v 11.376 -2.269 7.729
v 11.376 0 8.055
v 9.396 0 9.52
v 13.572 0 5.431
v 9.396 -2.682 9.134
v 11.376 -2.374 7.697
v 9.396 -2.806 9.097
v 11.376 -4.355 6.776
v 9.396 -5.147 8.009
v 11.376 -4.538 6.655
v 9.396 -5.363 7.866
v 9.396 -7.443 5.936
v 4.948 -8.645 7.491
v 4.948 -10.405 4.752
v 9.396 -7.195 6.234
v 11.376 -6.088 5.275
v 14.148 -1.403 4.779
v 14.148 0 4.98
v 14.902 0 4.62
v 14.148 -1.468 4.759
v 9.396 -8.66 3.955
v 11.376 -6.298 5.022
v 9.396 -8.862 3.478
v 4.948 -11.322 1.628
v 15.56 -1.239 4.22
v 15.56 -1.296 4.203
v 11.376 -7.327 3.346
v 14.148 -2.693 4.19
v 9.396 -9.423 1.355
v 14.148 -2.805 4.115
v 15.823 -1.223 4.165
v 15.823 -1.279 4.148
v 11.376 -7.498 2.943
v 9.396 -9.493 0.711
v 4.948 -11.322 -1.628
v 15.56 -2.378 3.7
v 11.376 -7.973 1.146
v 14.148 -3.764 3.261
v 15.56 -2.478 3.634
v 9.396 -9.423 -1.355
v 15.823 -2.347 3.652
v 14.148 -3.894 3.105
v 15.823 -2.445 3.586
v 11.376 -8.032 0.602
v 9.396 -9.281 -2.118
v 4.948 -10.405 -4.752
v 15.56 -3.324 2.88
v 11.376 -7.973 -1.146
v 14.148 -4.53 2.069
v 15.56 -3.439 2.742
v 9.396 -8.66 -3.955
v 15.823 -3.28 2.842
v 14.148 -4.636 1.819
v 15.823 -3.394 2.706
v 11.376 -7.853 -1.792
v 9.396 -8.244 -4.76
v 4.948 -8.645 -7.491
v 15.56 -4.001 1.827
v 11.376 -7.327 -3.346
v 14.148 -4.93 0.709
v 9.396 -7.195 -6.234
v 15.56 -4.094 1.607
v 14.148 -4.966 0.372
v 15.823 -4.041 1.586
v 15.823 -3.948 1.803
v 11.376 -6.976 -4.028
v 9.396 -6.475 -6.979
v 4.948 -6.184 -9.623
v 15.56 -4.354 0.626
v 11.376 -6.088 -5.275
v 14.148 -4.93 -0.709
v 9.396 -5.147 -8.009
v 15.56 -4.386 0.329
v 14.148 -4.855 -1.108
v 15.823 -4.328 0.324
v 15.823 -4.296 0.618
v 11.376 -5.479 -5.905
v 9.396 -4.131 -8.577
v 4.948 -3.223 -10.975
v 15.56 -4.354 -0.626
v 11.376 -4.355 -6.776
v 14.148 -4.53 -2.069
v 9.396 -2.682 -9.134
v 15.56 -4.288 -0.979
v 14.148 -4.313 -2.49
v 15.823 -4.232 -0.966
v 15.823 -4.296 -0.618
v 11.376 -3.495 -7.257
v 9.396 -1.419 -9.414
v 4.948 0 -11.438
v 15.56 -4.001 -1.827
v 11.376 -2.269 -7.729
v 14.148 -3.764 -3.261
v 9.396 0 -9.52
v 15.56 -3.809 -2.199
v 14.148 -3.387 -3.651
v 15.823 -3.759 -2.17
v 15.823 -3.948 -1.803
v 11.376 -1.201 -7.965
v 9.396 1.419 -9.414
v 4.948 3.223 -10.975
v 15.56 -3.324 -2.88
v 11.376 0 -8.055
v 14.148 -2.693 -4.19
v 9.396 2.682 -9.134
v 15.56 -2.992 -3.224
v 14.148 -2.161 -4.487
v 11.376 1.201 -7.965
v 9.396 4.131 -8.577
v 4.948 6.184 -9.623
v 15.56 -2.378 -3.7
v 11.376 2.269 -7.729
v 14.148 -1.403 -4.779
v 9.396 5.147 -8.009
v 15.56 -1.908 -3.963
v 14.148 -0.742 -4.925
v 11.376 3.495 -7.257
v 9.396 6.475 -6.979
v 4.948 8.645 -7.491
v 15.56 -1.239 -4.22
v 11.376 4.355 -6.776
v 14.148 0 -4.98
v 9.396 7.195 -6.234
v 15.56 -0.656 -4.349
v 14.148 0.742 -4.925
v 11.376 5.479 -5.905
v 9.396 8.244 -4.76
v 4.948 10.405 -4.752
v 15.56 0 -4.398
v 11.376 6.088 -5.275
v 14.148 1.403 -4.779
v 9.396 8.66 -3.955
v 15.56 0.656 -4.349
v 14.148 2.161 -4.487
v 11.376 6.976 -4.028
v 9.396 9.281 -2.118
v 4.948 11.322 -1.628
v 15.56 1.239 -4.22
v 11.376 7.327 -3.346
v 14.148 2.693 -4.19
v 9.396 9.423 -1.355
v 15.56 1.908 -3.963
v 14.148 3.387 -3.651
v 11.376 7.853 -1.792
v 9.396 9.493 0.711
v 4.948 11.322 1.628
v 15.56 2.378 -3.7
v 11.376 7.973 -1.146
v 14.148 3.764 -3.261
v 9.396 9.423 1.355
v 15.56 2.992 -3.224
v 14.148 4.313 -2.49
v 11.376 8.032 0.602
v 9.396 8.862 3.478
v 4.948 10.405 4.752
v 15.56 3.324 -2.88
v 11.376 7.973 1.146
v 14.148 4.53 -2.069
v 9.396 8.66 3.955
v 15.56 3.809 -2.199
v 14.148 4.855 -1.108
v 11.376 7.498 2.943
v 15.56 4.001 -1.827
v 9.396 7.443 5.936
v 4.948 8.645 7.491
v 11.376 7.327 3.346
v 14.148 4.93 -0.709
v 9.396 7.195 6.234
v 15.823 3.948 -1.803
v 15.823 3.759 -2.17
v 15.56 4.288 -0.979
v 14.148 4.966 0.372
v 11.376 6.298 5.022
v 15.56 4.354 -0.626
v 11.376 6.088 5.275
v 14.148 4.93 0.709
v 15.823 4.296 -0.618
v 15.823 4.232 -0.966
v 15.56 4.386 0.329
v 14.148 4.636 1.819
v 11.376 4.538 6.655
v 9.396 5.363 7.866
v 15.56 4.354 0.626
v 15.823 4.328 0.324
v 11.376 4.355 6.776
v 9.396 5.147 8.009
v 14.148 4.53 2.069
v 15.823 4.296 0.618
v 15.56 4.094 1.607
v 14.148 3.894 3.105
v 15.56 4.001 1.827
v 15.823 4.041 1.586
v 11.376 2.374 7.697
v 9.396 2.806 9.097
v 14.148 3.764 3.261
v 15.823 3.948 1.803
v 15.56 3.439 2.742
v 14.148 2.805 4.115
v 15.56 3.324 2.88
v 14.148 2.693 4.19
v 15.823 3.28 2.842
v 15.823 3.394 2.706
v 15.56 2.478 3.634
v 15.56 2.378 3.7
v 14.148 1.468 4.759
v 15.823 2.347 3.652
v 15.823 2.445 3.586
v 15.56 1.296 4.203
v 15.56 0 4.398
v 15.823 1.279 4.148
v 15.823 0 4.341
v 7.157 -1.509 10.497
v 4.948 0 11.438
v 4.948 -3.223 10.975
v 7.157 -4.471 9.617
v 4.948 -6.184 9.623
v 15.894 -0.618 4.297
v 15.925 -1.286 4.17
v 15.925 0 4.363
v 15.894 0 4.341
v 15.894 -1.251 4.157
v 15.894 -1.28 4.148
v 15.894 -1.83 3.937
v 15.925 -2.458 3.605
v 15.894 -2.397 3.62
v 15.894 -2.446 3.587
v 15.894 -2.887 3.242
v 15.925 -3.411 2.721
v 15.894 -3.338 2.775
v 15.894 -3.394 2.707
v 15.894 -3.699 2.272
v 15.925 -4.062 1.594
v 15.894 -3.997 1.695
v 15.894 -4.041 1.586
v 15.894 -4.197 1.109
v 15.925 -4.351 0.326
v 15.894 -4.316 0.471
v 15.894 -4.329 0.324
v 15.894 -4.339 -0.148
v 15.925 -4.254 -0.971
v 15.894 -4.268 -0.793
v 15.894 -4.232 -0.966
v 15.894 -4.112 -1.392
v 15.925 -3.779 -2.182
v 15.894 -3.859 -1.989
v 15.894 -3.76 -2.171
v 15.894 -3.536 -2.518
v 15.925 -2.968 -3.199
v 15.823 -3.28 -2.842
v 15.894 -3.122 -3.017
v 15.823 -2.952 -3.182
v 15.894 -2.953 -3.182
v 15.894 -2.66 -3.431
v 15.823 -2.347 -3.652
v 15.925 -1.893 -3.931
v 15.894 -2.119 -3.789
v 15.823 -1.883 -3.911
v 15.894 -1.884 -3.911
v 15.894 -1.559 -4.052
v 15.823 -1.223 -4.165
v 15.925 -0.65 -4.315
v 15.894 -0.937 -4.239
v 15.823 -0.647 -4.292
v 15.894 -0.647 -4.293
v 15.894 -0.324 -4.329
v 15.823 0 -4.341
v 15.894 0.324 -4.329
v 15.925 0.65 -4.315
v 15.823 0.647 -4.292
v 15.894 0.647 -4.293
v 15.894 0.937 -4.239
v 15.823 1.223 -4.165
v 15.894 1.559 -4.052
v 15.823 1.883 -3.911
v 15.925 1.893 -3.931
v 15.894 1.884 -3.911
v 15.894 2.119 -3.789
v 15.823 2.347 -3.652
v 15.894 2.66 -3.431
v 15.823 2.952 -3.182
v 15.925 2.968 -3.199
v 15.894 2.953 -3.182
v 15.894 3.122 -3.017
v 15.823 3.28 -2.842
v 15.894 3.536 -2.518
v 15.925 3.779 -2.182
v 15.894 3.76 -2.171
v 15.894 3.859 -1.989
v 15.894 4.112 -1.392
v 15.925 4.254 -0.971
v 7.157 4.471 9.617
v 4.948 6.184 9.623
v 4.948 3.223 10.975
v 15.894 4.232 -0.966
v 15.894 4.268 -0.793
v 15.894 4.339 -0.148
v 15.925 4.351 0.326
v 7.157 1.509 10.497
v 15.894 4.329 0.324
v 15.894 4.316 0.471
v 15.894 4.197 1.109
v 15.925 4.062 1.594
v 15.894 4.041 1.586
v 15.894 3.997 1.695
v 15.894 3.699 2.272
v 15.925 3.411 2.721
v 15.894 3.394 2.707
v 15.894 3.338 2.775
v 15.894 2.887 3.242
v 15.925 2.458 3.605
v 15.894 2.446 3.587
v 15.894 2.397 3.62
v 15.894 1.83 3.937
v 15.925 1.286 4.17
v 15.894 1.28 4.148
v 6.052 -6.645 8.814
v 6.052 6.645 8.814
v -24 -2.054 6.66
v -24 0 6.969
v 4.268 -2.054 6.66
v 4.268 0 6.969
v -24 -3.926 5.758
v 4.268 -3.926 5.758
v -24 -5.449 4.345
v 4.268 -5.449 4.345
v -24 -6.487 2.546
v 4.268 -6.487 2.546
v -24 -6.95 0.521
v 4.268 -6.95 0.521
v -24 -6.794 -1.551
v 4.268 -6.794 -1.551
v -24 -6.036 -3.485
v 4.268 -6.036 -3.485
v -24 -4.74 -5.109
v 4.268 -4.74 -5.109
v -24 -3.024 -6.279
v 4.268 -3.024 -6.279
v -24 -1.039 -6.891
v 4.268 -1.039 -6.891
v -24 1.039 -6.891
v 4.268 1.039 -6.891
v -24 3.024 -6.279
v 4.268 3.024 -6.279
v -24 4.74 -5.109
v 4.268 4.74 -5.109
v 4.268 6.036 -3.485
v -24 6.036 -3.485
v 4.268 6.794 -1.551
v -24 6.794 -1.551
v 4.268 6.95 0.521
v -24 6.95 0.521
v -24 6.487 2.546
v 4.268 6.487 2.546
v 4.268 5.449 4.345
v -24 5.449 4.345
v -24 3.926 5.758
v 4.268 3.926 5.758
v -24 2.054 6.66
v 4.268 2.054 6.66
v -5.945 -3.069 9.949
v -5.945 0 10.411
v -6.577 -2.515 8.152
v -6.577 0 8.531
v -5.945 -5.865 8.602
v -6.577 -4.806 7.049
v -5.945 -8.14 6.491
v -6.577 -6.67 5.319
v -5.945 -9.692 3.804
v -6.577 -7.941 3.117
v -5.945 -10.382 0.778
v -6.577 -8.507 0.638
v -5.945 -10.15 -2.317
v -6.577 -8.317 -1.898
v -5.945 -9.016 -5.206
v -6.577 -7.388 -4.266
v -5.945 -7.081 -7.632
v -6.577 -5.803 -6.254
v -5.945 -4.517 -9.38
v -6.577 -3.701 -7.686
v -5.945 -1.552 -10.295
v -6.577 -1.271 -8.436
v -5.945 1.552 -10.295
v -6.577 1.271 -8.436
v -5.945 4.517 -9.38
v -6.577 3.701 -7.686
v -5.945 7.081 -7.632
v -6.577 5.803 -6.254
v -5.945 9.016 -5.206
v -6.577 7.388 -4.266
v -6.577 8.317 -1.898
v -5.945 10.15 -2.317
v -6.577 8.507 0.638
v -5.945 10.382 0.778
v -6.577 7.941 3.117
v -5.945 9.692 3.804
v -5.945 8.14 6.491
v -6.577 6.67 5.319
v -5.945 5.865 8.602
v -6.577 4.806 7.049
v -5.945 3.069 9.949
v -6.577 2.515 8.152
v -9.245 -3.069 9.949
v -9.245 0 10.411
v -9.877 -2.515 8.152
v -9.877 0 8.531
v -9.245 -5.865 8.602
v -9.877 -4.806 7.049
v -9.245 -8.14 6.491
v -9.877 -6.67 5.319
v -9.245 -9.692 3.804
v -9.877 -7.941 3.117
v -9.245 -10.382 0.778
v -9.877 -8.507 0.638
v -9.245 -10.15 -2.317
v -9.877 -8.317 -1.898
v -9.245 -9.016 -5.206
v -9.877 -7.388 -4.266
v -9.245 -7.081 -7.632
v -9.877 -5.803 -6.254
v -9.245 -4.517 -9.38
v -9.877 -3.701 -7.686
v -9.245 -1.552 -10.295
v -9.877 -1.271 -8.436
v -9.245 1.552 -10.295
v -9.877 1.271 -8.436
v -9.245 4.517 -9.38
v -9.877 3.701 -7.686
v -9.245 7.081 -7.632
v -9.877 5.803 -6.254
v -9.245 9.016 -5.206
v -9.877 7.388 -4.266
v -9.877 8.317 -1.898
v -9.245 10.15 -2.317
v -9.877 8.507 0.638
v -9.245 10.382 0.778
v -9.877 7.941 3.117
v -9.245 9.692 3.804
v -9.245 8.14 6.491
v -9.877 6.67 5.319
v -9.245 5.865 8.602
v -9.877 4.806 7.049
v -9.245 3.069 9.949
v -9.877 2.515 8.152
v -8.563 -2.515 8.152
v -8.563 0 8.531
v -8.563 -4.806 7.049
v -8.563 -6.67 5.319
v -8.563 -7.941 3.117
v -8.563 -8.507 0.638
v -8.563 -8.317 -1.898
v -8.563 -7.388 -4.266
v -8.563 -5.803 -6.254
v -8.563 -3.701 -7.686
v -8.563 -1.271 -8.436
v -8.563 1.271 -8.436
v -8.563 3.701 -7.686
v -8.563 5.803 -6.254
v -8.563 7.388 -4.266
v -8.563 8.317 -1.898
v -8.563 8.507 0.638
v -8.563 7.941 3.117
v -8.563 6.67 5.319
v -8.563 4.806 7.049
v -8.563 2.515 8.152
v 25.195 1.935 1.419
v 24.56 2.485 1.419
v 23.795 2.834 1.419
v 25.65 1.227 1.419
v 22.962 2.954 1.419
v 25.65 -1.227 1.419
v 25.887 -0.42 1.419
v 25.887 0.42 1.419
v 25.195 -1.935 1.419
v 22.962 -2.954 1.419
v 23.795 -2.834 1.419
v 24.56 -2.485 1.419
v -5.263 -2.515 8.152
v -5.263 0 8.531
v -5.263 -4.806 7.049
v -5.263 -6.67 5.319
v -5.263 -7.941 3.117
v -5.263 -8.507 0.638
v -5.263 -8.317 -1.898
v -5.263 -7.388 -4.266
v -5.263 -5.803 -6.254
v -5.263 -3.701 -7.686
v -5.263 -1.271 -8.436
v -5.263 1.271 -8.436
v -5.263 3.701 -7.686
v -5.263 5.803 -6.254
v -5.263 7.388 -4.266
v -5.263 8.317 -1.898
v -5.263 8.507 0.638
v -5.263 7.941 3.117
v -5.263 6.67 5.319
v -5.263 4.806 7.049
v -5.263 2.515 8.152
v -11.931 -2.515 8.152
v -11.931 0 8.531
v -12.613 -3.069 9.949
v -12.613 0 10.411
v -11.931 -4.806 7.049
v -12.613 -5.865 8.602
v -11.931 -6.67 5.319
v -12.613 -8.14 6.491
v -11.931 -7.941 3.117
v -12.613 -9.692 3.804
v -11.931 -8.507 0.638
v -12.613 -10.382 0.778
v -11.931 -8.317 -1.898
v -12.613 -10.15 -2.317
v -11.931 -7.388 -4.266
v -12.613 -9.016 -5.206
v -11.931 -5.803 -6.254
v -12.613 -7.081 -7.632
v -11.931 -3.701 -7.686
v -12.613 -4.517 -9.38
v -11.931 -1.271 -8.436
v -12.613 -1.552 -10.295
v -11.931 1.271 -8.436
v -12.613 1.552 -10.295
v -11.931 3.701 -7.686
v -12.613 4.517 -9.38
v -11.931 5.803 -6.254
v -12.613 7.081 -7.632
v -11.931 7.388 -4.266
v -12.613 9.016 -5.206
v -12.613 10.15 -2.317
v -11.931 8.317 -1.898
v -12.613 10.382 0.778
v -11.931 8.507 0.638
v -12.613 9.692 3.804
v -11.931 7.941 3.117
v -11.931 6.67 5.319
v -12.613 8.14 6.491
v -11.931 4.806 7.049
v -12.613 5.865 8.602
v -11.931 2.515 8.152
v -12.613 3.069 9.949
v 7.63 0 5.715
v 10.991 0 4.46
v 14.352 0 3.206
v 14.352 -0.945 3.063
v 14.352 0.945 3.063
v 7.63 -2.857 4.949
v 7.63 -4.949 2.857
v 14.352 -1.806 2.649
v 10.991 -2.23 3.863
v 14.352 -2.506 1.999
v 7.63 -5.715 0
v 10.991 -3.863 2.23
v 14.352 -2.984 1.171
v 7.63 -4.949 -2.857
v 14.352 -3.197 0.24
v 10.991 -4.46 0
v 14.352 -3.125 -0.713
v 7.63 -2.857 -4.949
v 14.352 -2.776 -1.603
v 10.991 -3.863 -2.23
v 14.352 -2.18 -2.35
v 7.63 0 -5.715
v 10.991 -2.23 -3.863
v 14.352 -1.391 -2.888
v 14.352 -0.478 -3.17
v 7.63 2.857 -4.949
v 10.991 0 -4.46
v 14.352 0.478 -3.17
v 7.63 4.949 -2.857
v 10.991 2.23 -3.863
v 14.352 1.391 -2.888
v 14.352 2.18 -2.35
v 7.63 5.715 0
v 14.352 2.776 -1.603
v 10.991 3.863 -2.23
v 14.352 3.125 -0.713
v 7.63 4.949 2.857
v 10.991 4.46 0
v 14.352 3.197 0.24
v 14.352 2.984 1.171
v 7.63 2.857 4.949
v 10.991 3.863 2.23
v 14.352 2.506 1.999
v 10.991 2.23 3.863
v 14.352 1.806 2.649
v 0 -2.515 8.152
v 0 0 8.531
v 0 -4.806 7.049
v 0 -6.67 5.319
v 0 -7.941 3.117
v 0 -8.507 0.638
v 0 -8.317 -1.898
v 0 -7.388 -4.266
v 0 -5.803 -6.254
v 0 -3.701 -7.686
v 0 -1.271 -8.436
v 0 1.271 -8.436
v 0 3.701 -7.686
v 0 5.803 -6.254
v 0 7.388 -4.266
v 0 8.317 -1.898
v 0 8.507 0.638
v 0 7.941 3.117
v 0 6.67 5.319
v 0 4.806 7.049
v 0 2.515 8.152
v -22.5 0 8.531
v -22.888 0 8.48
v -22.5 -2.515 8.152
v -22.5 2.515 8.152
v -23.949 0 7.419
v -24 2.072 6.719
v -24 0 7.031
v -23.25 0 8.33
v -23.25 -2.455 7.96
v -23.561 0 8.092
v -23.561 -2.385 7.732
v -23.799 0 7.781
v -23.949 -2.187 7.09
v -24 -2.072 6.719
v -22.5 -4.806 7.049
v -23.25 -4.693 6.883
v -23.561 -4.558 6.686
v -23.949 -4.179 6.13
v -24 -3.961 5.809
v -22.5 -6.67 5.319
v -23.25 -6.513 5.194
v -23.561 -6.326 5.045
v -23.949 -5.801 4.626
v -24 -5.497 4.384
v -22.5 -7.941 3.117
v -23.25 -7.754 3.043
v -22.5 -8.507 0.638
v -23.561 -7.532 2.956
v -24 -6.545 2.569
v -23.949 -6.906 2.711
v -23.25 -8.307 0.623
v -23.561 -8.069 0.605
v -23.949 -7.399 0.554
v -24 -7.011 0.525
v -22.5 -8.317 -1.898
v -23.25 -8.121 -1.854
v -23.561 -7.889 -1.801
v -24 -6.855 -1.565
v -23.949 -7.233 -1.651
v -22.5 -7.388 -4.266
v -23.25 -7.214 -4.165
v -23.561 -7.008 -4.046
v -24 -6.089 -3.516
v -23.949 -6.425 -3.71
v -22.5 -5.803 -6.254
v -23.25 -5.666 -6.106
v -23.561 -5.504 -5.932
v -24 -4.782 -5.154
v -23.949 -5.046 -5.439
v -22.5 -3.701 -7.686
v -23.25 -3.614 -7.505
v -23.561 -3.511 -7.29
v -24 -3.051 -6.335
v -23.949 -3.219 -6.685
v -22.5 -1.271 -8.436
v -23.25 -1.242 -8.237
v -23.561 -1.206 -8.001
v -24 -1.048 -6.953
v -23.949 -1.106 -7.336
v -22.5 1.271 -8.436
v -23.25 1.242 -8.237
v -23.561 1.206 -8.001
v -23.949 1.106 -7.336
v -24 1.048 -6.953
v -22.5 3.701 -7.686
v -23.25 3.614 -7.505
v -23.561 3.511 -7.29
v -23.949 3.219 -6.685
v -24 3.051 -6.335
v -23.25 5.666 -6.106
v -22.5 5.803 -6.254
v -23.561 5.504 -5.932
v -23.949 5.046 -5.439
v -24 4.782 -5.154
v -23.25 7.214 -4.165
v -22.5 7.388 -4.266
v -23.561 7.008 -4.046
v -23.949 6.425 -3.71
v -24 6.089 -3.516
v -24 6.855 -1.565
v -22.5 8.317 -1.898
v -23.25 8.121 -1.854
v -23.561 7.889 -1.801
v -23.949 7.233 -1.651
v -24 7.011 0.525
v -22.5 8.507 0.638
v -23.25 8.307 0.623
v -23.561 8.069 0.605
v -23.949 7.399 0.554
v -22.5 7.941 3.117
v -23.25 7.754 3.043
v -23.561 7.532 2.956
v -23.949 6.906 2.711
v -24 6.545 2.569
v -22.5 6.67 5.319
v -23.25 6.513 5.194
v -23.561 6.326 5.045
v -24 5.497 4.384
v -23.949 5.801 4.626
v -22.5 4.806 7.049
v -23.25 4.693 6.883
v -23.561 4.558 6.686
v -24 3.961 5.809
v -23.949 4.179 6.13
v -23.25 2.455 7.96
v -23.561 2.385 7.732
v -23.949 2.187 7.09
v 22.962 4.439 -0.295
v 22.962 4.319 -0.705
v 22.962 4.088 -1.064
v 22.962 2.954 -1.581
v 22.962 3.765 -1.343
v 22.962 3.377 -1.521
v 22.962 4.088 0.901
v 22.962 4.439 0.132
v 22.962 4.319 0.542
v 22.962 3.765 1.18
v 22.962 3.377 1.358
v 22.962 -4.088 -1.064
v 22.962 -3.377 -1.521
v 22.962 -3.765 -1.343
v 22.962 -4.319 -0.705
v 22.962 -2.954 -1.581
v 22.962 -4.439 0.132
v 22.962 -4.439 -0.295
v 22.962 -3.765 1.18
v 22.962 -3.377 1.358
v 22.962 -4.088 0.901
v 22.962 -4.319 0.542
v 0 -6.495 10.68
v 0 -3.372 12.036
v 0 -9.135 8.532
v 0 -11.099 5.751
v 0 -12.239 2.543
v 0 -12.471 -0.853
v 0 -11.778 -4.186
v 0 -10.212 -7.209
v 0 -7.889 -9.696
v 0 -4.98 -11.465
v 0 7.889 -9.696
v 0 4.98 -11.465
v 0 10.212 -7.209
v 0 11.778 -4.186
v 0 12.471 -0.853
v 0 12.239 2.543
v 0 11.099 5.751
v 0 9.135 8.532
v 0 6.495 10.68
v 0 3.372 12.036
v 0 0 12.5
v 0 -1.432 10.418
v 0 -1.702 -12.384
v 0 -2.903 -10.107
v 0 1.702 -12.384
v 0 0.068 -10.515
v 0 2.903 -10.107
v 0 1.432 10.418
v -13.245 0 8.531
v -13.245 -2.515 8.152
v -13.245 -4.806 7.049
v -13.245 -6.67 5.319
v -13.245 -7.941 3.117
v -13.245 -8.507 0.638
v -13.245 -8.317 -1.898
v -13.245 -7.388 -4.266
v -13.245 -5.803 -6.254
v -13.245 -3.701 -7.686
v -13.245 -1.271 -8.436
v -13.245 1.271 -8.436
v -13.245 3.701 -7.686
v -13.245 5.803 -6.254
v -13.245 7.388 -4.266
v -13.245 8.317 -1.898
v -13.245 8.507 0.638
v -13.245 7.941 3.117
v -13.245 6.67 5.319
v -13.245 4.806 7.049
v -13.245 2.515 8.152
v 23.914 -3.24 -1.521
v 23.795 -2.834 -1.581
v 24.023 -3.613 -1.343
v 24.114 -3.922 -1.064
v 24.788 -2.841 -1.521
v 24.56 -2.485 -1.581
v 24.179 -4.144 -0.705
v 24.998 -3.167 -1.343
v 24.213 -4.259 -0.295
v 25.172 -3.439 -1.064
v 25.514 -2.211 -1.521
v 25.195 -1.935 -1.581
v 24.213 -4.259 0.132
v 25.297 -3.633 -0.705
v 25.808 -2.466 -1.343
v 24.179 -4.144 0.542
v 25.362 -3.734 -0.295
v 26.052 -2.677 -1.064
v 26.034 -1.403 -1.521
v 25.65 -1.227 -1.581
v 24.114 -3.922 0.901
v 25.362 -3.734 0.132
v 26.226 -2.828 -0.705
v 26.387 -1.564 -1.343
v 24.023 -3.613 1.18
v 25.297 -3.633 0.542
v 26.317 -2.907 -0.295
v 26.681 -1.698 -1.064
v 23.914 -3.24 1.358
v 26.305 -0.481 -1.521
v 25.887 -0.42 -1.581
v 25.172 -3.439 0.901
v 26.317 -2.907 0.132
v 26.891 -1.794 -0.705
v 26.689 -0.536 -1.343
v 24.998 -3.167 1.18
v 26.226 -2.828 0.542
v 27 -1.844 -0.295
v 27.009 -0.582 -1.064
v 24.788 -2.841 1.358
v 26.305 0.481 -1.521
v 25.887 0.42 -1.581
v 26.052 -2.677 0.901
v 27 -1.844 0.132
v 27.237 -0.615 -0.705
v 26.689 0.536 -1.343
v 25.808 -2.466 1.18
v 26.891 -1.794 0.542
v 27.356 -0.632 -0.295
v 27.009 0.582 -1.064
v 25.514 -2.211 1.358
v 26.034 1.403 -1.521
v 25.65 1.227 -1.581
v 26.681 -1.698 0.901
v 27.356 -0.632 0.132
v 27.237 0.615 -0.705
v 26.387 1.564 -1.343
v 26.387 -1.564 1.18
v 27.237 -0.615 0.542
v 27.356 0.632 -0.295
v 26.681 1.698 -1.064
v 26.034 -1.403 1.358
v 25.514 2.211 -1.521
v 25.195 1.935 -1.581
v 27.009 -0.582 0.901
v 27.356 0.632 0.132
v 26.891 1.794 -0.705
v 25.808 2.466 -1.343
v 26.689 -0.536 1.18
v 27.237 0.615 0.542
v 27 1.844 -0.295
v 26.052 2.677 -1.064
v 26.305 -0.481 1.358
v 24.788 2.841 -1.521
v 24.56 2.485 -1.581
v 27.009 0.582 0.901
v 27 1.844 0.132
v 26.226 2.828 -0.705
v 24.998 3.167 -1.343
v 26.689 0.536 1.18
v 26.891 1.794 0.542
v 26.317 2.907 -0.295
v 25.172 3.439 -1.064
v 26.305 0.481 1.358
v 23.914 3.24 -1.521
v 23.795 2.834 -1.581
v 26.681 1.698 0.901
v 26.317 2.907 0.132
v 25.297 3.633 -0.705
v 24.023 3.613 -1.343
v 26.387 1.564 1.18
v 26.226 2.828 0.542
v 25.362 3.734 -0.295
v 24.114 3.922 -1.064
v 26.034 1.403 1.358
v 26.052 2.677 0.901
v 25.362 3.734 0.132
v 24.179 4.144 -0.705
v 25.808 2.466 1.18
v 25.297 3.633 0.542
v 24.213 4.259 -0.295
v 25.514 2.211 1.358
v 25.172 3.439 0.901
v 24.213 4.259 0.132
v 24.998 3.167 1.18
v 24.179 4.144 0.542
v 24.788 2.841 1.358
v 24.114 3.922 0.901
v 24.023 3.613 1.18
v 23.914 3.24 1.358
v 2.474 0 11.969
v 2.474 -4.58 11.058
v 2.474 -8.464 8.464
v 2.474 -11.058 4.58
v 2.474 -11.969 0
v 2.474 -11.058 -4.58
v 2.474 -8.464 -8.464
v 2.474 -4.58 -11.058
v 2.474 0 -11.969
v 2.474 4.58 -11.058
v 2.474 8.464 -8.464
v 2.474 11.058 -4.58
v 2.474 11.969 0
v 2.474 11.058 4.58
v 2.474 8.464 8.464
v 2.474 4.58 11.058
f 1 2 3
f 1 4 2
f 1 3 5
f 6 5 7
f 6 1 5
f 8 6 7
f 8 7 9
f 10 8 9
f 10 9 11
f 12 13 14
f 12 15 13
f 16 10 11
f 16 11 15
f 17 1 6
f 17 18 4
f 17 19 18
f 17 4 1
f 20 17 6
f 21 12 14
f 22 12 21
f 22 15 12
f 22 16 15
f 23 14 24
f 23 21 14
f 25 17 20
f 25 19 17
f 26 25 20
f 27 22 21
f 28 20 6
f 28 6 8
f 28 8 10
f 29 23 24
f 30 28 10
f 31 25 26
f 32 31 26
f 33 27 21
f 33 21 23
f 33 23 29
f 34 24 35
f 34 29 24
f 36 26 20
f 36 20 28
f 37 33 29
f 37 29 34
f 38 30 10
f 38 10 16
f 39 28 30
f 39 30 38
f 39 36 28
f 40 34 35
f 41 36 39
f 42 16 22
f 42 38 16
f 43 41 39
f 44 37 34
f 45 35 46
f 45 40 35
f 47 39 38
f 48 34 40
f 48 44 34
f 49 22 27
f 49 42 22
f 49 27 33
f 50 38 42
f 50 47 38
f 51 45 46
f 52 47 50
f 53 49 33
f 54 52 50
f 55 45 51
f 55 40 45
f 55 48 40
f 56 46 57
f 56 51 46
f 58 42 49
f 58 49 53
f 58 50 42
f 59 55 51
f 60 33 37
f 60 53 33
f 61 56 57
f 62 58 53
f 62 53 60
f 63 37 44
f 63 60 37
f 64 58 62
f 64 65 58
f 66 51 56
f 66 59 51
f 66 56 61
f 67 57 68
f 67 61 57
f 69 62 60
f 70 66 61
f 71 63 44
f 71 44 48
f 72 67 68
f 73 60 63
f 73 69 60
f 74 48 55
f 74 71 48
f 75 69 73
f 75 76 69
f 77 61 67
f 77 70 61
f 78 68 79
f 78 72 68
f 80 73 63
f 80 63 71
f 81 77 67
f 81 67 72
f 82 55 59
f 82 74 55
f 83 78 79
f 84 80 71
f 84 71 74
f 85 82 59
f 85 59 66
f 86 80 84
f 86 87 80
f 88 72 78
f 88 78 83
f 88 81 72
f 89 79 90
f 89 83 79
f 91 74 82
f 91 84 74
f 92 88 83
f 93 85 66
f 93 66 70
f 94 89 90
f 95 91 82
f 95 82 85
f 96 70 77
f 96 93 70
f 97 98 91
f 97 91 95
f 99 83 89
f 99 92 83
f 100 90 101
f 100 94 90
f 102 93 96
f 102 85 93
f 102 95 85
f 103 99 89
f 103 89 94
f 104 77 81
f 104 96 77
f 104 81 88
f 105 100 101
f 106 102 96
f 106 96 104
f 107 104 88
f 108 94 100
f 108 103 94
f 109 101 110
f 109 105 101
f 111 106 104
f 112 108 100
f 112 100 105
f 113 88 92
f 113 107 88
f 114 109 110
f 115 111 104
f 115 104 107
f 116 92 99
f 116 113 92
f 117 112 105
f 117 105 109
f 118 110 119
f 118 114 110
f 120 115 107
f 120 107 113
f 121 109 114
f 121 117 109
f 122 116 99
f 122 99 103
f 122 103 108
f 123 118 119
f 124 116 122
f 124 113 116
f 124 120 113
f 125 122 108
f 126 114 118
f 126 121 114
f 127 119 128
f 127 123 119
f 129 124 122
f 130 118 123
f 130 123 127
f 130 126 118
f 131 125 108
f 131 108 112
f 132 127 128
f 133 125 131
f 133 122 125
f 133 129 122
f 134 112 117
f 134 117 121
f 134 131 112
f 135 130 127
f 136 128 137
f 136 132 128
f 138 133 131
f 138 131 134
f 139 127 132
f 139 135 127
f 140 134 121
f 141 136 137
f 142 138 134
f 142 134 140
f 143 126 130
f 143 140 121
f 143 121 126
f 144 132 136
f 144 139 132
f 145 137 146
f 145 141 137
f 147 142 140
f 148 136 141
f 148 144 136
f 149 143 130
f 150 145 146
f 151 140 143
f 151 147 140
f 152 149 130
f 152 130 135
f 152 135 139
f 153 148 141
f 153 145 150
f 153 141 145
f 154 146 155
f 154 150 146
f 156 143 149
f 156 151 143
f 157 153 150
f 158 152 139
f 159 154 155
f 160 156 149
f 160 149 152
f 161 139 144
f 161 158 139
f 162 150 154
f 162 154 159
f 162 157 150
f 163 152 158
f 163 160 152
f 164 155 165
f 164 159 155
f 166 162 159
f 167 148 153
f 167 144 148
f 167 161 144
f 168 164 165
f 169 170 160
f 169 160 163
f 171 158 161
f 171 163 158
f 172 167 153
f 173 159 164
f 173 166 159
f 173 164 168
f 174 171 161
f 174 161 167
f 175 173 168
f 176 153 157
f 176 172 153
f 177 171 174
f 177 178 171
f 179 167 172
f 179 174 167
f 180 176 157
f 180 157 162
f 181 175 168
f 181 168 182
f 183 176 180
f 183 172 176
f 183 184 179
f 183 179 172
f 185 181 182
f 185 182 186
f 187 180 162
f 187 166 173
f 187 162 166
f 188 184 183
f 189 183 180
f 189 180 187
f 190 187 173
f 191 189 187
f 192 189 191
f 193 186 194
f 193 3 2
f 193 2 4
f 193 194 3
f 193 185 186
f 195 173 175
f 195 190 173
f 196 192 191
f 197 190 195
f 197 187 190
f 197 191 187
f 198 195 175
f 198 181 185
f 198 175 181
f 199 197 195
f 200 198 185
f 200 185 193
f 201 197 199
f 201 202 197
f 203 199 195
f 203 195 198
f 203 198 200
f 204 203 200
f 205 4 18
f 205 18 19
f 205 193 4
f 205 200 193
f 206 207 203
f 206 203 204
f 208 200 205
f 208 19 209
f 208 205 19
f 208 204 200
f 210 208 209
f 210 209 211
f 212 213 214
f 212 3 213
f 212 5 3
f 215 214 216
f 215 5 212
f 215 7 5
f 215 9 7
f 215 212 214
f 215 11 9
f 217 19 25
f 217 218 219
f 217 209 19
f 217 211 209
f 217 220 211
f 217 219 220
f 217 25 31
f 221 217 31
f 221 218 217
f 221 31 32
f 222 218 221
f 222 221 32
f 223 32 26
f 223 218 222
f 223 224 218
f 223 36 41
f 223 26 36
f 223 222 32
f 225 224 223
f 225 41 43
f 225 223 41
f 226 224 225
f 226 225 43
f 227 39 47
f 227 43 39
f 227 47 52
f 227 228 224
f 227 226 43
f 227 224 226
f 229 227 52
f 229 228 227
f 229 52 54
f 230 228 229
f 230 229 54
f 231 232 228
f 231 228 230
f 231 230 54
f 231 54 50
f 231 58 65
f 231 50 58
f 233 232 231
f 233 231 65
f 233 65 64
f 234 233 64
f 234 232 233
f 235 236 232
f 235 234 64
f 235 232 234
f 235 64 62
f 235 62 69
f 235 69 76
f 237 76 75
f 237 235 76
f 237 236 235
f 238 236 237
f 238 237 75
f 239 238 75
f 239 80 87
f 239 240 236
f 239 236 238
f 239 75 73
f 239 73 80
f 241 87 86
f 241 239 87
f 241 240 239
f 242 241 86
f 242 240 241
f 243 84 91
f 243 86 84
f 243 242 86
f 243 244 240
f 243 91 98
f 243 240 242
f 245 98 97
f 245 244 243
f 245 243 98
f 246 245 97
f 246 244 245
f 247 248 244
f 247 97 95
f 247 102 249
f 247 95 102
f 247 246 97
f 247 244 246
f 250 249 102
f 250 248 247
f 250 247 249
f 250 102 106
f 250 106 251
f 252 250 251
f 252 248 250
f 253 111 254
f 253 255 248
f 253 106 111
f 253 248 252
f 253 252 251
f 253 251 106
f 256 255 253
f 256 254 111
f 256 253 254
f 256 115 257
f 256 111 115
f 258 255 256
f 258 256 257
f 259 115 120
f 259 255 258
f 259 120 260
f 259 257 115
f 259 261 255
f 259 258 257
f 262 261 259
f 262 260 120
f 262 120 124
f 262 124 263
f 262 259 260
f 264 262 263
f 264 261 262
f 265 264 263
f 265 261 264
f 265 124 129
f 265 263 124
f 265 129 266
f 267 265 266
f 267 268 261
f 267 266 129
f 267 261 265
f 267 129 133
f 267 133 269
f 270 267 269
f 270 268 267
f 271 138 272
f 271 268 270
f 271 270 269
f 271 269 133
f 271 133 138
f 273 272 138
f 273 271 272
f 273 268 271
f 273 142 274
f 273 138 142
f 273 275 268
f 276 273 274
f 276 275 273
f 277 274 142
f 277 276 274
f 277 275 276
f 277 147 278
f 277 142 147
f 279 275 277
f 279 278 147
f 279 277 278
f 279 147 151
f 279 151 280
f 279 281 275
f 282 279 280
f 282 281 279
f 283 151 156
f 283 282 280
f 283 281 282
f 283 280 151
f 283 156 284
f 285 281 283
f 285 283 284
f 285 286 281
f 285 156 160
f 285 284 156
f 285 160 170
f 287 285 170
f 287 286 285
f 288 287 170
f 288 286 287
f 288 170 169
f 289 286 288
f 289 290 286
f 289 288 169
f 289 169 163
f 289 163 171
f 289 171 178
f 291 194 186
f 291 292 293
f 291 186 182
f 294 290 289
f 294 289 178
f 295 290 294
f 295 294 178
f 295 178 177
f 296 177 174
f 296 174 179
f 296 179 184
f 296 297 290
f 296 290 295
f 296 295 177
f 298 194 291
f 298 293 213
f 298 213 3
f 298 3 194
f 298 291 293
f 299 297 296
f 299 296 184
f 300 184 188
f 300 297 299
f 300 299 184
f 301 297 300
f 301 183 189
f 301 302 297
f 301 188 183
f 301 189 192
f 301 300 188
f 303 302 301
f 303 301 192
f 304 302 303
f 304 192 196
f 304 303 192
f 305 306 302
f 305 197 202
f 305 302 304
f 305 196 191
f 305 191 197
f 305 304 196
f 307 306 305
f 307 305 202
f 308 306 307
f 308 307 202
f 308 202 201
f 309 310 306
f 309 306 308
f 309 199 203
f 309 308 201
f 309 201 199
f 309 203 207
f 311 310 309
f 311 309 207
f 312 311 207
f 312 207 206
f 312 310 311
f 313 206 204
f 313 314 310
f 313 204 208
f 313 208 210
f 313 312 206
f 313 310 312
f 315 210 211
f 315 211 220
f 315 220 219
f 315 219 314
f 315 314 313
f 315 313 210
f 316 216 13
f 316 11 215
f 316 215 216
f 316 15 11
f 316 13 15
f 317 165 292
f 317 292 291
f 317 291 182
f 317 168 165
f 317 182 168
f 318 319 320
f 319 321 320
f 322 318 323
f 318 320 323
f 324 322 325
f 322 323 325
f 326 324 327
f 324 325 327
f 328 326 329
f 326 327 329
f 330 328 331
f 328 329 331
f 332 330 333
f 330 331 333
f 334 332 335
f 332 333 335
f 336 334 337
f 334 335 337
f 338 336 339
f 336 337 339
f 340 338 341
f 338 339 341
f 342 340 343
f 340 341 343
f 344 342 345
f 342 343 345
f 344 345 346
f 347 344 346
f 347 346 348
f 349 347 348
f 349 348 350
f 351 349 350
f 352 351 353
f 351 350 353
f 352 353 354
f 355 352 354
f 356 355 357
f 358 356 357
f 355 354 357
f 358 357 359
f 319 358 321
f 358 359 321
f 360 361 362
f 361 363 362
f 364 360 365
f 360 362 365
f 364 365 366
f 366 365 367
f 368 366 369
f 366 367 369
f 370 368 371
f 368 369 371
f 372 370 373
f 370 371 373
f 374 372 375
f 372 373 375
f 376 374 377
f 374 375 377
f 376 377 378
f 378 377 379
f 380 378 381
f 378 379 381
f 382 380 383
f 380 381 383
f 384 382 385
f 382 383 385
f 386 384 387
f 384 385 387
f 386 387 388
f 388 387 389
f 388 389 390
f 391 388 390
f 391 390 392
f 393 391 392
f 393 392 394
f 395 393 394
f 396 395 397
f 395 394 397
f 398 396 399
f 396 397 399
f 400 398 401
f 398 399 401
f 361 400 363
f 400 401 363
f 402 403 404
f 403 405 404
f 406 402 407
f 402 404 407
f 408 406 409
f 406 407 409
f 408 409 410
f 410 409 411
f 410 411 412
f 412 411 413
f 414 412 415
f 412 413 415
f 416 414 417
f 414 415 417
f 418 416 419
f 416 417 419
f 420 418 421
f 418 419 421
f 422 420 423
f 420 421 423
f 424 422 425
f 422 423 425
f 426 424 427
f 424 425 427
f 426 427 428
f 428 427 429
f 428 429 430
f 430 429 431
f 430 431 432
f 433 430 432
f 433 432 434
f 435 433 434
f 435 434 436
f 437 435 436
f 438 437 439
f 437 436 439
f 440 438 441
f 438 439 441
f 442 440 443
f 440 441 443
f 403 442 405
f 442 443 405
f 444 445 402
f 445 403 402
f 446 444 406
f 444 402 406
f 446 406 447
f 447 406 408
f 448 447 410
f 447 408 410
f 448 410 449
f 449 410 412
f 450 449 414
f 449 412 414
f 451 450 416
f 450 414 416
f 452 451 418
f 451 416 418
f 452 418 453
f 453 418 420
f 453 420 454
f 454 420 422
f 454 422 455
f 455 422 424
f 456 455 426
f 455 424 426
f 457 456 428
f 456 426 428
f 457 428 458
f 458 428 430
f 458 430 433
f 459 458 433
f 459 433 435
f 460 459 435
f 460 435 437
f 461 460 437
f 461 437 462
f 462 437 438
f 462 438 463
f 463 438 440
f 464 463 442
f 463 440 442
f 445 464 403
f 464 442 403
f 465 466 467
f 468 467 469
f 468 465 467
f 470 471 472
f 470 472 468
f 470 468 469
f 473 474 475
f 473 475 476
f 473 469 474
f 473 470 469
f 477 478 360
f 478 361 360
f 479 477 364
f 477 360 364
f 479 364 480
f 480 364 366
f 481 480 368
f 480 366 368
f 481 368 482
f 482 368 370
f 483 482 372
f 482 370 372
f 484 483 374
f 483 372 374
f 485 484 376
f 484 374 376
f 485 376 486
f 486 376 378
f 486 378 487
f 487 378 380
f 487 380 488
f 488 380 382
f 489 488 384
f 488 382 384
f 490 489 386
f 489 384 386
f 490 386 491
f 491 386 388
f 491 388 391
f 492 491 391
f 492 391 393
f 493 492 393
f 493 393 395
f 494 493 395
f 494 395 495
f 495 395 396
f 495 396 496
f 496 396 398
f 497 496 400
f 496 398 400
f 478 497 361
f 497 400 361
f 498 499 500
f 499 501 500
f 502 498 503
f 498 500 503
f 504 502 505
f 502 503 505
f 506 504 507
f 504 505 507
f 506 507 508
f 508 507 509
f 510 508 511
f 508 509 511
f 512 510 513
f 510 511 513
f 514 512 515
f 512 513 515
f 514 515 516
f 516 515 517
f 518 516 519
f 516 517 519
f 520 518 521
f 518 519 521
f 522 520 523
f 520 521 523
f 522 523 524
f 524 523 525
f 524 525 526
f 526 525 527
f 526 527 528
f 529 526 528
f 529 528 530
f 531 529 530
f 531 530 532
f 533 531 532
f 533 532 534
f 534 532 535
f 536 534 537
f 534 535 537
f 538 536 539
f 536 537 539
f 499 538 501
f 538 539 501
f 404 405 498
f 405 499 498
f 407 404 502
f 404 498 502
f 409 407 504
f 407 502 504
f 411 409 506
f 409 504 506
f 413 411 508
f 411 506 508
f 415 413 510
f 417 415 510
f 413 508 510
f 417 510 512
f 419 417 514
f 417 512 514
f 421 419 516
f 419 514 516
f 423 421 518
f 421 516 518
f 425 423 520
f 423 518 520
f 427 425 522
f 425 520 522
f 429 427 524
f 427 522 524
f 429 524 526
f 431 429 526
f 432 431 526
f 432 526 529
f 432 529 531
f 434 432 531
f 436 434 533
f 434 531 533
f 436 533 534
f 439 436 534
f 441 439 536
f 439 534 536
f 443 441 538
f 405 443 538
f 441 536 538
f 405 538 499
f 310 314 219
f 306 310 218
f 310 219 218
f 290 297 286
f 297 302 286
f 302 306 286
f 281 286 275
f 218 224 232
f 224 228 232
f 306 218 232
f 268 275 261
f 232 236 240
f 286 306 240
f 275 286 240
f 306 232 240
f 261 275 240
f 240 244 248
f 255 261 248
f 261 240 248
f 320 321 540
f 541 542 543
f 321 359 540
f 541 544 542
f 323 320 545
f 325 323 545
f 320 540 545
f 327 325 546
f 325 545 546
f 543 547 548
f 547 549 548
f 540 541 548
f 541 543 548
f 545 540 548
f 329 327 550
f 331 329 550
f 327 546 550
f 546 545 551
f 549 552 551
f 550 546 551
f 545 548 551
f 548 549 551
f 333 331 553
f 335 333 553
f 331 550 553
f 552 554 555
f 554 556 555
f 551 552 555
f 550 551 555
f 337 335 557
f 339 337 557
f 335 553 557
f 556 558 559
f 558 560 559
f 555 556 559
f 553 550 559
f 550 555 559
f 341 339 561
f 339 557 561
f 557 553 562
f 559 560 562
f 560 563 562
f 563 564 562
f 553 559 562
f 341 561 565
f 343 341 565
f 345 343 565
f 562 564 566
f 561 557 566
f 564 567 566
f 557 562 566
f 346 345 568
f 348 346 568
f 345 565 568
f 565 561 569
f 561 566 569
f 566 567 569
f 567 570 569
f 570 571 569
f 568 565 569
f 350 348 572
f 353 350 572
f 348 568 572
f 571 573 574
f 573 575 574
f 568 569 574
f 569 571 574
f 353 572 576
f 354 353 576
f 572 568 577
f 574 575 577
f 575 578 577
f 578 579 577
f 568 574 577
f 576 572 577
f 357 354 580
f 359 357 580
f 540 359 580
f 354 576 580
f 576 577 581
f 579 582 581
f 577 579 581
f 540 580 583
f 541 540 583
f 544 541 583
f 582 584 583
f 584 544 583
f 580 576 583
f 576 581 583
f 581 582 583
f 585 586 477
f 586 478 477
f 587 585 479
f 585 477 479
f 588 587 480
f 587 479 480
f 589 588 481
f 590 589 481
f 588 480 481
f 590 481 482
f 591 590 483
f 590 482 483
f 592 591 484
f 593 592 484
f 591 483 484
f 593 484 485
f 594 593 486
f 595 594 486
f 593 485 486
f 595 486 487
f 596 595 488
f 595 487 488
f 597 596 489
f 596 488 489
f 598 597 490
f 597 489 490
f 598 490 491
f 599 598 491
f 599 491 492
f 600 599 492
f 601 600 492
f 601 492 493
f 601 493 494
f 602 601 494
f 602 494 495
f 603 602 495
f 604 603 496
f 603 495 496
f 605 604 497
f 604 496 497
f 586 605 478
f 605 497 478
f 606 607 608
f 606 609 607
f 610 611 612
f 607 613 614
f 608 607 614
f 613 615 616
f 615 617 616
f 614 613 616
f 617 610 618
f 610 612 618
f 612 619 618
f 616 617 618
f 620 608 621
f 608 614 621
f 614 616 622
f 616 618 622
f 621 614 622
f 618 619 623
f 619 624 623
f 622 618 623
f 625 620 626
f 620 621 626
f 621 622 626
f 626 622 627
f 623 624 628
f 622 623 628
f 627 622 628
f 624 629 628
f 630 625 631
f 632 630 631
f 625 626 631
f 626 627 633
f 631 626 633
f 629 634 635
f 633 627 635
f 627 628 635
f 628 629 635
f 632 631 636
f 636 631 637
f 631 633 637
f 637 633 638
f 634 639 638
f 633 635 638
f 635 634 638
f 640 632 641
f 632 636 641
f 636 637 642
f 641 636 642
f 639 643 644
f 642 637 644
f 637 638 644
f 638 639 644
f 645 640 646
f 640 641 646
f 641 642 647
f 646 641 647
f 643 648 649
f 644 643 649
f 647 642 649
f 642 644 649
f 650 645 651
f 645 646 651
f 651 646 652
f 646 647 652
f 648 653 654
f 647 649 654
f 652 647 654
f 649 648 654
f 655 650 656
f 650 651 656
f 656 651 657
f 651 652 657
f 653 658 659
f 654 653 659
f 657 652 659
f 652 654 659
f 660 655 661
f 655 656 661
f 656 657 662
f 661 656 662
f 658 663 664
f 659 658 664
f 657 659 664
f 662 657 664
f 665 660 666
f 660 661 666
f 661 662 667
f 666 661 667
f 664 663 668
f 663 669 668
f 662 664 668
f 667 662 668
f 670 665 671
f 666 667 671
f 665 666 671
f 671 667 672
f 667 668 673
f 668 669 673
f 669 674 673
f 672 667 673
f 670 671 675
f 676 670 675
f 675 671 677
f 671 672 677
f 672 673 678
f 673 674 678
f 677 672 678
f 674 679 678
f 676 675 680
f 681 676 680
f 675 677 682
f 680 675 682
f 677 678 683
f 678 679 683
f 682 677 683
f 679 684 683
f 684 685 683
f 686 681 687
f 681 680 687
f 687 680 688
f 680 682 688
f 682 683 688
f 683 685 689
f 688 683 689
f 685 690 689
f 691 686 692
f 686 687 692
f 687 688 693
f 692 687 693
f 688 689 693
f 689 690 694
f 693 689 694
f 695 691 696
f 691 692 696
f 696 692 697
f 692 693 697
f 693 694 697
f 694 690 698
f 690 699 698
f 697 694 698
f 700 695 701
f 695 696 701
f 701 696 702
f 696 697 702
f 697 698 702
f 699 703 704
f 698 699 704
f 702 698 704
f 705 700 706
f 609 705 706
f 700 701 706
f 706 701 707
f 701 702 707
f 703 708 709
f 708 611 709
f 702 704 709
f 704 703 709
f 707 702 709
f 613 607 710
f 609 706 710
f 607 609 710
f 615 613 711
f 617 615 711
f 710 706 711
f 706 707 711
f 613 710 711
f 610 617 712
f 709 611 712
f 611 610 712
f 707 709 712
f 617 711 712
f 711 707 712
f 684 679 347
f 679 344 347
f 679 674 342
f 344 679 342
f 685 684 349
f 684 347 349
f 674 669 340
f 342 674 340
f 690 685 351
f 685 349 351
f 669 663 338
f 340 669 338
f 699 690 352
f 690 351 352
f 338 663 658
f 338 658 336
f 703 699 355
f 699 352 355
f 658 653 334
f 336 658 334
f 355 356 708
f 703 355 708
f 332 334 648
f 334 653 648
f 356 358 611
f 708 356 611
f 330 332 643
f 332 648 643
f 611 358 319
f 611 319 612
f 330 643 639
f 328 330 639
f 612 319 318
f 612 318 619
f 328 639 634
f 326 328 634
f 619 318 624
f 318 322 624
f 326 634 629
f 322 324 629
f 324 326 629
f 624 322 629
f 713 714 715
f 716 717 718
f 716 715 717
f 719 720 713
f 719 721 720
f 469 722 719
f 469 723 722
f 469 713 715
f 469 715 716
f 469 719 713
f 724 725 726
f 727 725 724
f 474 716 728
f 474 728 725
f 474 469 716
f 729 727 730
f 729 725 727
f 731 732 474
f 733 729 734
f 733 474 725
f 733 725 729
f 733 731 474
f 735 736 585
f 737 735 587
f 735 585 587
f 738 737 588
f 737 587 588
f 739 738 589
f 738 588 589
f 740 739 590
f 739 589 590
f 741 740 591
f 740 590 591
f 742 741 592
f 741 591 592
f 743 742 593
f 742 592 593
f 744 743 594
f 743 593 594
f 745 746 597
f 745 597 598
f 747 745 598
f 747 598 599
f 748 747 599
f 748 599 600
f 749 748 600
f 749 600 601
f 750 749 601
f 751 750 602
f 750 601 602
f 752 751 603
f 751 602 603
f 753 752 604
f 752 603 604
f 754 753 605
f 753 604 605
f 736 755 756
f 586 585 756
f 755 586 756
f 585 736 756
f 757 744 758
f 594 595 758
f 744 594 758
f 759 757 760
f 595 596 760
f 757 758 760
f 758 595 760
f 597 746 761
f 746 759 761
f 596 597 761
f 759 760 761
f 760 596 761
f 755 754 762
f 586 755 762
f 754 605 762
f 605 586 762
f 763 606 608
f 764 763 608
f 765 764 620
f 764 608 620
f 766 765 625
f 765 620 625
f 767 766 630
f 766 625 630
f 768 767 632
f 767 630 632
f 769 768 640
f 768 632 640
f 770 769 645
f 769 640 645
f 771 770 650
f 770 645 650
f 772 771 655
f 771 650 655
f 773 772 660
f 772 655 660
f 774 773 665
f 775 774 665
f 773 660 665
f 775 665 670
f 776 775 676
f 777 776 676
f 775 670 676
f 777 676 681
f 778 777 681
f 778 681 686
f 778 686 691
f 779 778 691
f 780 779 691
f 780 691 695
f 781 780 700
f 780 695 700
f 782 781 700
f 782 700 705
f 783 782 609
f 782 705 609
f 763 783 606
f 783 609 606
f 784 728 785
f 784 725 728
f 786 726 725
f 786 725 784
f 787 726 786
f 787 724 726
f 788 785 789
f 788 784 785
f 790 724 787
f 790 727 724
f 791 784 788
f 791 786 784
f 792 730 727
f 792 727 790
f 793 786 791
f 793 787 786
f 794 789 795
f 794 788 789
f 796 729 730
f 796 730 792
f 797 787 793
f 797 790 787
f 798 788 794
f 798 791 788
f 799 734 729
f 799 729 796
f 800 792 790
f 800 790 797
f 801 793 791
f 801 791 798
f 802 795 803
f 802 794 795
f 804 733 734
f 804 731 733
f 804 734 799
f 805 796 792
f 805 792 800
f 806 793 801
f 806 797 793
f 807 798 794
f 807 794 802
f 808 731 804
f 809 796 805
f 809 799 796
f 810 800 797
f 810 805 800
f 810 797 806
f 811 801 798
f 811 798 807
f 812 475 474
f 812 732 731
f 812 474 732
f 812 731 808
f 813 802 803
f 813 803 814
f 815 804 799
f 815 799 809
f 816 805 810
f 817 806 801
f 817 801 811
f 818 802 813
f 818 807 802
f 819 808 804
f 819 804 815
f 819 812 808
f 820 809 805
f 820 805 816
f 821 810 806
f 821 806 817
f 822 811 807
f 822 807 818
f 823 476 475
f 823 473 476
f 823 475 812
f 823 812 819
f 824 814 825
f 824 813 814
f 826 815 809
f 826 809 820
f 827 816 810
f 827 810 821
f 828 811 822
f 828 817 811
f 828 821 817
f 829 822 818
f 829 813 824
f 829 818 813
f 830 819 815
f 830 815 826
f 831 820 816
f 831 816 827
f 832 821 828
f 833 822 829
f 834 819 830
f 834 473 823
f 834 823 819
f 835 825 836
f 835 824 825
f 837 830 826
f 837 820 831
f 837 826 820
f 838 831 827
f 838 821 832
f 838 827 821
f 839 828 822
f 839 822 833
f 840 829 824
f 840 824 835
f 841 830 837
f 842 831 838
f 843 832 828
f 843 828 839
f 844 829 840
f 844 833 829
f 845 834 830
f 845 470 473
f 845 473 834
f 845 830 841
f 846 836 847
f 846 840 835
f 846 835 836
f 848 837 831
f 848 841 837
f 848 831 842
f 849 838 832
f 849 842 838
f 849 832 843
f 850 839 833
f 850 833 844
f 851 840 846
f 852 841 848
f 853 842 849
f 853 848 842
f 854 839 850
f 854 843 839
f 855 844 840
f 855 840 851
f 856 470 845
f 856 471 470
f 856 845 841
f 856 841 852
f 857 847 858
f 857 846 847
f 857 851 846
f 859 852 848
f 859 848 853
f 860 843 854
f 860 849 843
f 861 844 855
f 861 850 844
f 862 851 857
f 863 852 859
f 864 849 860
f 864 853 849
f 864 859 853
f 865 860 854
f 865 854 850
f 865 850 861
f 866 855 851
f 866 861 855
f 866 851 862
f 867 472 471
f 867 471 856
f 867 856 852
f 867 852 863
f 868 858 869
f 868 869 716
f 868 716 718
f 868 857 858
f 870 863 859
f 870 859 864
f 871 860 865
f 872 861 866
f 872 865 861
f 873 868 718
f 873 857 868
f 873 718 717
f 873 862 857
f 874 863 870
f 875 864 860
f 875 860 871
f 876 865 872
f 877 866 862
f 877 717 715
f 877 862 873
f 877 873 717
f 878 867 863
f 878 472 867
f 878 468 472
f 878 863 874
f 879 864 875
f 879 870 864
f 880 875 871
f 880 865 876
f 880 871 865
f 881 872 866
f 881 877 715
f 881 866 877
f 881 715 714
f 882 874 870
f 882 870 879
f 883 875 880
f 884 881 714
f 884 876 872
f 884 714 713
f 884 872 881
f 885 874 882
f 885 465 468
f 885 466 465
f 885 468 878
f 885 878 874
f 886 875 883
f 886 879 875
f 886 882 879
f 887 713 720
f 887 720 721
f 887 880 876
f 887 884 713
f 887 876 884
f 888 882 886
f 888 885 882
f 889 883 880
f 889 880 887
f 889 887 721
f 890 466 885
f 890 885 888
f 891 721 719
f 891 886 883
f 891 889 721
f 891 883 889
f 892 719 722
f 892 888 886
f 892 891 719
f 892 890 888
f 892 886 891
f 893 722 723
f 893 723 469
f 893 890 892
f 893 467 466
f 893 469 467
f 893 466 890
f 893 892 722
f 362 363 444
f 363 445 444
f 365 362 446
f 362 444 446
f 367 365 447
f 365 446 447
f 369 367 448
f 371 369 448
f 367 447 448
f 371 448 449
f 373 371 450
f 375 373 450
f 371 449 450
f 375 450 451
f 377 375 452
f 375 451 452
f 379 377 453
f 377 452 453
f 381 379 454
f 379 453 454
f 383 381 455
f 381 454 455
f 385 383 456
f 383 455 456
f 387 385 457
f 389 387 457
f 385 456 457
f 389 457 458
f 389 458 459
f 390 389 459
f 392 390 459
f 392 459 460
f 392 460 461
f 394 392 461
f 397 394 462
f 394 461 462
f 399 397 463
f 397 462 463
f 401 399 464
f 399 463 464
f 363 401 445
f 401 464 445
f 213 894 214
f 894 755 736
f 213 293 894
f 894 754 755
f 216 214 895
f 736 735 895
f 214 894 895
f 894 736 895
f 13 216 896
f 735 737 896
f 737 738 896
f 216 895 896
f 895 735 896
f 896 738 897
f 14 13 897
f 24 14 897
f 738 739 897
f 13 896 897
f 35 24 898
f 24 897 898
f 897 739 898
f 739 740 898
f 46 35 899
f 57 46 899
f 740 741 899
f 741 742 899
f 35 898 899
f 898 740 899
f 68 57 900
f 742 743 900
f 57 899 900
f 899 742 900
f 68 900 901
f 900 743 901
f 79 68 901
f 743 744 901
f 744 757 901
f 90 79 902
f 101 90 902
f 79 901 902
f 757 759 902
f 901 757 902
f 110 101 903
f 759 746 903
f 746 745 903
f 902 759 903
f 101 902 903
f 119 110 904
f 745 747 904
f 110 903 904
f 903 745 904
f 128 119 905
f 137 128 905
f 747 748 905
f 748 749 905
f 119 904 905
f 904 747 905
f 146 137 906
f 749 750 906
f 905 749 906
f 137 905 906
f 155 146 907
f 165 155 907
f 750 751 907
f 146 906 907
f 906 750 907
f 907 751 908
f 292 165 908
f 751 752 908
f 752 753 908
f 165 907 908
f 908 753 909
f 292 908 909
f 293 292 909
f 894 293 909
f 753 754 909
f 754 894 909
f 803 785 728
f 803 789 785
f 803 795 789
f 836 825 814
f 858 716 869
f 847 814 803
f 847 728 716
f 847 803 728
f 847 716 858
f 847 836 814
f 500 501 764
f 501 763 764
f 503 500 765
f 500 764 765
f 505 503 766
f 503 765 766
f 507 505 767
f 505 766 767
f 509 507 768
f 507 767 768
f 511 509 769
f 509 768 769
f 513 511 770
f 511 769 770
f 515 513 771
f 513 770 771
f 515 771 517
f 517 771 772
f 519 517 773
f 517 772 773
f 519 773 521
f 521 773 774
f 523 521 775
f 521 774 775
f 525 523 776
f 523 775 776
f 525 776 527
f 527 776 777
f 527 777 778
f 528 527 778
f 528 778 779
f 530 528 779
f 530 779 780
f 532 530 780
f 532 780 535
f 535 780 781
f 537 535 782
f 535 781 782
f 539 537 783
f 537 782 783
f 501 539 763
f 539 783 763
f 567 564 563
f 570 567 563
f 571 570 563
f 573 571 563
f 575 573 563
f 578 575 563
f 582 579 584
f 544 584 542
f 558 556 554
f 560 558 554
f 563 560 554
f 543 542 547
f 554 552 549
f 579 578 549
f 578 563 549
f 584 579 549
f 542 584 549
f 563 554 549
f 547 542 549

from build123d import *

# Parameters (mm, degrees)
F3_ANGLE_BACK = 90
F3_ANGLE      = 180
F5_R          = 1.5


# Not quite as in the source:
# - the program builds the solid bodies; features that only make, move or delete a surface that nothing else refers to are left out


with BuildPart() as f1:
    # F0 (on Front) → F1 (revolve)
    with BuildSketch(Plane.XZ):
        Polygon((-6.5773623064, 8.5310461), (-5.2633433491, 8.5310461), (-5.9452718124, 10.4112434772), align=None)
        with BuildLine():
            Line((0, 12.5), (-2.086e-07, 8.5310461))
            Line((-2.086e-07, 8.5310461), (-5.2633433491, 8.5310461))
            Line((-5.2633433491, 8.5310461), (-6.5773623064, 8.5310461))
            Line((-6.5773623064, 8.5310461), (-8.5633396059, 8.5310461))
            Line((-8.5633396059, 8.5310461), (-9.8773585632, 8.5310461))
            Line((-9.8773585632, 8.5310461), (-11.9312460423, 8.5310461))
            Line((-11.9312460423, 8.5310461), (-13.2452649996, 8.5310461))
            Line((-13.2452649996, 8.5310461), (-24.0000002086, 8.5310461))
            Line((-24.0000002086, 8.5310461), (-24.0000002086, 6.969221402))
            Line((-24.0000002086, 6.969221402), (4.2684120126, 6.969221402))
            Line((4.2684120126, 6.969221402), (14.3519612029, 3.2055957709))
            Line((14.3519612029, 3.2055957709), (14.3519612029, 0))
            Line((14.3519612029, 0), (15.9248222774, 0))
            Line((15.9248222774, 0), (15.9248222774, 4.3634505053))
            add(Edge.make_bspline(
                [(4.947933834, 11.4384293556), (5.9793661215, 11.0697915829), (8.0593561798, 10.3198783934), (11.2462916486, 8.5163300937), (12.8397611568, 6.2322058814), (13.8845362692, 5.0202002888), (15.0923938592, 4.5281993111), (15.8833928624, 4.2969274606), (15.9231948476, 4.3586775517), (15.9248222774, 4.3634505053)],
                knots=[0, 0, 0, 0, 0.204407807, 0.4182345345, 0.6036515616, 0.742726845, 0.8743332982, 0.9688664238, 0.9757506271, 0.9757506271, 0.9757506271, 0.9757506271], degree=3))
            Line((4.947933834, 11.4384293556), (0, 12.5))
        make_face()
        Polygon((-9.8773585632, 8.5310461), (-8.5633396059, 8.5310461), (-9.2452680692, 10.4112434772), align=None)
        Polygon((-13.2452649996, 8.5310461), (-11.9312460423, 8.5310461), (-12.6131745055, 10.4112434772), align=None)
    revolve(axis=Axis((-3.8916748017, 0, 0), (1, 0, 0)))

    # F5
    f5_edges = [f1.edges().sort_by_distance(p)[0] for p in [
        (-24, 0, -8.531046),
    ]]
    fillet(f5_edges, radius=F5_R)


with BuildPart() as f3:
    # F2 (on Front) → F3 (revolve)
    with BuildSketch(Plane.XZ, mode=Mode.PRIVATE) as f3_sk:
        with BuildLine():
            Line((22.9624137282, 1.4185722424), (22.9624137282, -1.5814277576))
            Line((22.9624137282, -1.5814277576), (25.9165772951, -1.5814277576))
            ThreePointArc((25.9165772951, -1.5814277576), (27.4165772951, -0.0814277576), (25.9165772951, 1.4185722424))
            Line((25.9165772951, 1.4185722424), (22.9624137282, 1.4185722424))
        make_face()
    revolve(f3_sk.sketch.rotate(Axis((22.9624137282, 0, -0.0814277576), (0, 0, 1)), -F3_ANGLE_BACK), axis=Axis((22.9624137282, 0, -0.0814277576), (0, 0, 1)), revolution_arc=F3_ANGLE)


solid = Compound([f1.part, f3.part])
